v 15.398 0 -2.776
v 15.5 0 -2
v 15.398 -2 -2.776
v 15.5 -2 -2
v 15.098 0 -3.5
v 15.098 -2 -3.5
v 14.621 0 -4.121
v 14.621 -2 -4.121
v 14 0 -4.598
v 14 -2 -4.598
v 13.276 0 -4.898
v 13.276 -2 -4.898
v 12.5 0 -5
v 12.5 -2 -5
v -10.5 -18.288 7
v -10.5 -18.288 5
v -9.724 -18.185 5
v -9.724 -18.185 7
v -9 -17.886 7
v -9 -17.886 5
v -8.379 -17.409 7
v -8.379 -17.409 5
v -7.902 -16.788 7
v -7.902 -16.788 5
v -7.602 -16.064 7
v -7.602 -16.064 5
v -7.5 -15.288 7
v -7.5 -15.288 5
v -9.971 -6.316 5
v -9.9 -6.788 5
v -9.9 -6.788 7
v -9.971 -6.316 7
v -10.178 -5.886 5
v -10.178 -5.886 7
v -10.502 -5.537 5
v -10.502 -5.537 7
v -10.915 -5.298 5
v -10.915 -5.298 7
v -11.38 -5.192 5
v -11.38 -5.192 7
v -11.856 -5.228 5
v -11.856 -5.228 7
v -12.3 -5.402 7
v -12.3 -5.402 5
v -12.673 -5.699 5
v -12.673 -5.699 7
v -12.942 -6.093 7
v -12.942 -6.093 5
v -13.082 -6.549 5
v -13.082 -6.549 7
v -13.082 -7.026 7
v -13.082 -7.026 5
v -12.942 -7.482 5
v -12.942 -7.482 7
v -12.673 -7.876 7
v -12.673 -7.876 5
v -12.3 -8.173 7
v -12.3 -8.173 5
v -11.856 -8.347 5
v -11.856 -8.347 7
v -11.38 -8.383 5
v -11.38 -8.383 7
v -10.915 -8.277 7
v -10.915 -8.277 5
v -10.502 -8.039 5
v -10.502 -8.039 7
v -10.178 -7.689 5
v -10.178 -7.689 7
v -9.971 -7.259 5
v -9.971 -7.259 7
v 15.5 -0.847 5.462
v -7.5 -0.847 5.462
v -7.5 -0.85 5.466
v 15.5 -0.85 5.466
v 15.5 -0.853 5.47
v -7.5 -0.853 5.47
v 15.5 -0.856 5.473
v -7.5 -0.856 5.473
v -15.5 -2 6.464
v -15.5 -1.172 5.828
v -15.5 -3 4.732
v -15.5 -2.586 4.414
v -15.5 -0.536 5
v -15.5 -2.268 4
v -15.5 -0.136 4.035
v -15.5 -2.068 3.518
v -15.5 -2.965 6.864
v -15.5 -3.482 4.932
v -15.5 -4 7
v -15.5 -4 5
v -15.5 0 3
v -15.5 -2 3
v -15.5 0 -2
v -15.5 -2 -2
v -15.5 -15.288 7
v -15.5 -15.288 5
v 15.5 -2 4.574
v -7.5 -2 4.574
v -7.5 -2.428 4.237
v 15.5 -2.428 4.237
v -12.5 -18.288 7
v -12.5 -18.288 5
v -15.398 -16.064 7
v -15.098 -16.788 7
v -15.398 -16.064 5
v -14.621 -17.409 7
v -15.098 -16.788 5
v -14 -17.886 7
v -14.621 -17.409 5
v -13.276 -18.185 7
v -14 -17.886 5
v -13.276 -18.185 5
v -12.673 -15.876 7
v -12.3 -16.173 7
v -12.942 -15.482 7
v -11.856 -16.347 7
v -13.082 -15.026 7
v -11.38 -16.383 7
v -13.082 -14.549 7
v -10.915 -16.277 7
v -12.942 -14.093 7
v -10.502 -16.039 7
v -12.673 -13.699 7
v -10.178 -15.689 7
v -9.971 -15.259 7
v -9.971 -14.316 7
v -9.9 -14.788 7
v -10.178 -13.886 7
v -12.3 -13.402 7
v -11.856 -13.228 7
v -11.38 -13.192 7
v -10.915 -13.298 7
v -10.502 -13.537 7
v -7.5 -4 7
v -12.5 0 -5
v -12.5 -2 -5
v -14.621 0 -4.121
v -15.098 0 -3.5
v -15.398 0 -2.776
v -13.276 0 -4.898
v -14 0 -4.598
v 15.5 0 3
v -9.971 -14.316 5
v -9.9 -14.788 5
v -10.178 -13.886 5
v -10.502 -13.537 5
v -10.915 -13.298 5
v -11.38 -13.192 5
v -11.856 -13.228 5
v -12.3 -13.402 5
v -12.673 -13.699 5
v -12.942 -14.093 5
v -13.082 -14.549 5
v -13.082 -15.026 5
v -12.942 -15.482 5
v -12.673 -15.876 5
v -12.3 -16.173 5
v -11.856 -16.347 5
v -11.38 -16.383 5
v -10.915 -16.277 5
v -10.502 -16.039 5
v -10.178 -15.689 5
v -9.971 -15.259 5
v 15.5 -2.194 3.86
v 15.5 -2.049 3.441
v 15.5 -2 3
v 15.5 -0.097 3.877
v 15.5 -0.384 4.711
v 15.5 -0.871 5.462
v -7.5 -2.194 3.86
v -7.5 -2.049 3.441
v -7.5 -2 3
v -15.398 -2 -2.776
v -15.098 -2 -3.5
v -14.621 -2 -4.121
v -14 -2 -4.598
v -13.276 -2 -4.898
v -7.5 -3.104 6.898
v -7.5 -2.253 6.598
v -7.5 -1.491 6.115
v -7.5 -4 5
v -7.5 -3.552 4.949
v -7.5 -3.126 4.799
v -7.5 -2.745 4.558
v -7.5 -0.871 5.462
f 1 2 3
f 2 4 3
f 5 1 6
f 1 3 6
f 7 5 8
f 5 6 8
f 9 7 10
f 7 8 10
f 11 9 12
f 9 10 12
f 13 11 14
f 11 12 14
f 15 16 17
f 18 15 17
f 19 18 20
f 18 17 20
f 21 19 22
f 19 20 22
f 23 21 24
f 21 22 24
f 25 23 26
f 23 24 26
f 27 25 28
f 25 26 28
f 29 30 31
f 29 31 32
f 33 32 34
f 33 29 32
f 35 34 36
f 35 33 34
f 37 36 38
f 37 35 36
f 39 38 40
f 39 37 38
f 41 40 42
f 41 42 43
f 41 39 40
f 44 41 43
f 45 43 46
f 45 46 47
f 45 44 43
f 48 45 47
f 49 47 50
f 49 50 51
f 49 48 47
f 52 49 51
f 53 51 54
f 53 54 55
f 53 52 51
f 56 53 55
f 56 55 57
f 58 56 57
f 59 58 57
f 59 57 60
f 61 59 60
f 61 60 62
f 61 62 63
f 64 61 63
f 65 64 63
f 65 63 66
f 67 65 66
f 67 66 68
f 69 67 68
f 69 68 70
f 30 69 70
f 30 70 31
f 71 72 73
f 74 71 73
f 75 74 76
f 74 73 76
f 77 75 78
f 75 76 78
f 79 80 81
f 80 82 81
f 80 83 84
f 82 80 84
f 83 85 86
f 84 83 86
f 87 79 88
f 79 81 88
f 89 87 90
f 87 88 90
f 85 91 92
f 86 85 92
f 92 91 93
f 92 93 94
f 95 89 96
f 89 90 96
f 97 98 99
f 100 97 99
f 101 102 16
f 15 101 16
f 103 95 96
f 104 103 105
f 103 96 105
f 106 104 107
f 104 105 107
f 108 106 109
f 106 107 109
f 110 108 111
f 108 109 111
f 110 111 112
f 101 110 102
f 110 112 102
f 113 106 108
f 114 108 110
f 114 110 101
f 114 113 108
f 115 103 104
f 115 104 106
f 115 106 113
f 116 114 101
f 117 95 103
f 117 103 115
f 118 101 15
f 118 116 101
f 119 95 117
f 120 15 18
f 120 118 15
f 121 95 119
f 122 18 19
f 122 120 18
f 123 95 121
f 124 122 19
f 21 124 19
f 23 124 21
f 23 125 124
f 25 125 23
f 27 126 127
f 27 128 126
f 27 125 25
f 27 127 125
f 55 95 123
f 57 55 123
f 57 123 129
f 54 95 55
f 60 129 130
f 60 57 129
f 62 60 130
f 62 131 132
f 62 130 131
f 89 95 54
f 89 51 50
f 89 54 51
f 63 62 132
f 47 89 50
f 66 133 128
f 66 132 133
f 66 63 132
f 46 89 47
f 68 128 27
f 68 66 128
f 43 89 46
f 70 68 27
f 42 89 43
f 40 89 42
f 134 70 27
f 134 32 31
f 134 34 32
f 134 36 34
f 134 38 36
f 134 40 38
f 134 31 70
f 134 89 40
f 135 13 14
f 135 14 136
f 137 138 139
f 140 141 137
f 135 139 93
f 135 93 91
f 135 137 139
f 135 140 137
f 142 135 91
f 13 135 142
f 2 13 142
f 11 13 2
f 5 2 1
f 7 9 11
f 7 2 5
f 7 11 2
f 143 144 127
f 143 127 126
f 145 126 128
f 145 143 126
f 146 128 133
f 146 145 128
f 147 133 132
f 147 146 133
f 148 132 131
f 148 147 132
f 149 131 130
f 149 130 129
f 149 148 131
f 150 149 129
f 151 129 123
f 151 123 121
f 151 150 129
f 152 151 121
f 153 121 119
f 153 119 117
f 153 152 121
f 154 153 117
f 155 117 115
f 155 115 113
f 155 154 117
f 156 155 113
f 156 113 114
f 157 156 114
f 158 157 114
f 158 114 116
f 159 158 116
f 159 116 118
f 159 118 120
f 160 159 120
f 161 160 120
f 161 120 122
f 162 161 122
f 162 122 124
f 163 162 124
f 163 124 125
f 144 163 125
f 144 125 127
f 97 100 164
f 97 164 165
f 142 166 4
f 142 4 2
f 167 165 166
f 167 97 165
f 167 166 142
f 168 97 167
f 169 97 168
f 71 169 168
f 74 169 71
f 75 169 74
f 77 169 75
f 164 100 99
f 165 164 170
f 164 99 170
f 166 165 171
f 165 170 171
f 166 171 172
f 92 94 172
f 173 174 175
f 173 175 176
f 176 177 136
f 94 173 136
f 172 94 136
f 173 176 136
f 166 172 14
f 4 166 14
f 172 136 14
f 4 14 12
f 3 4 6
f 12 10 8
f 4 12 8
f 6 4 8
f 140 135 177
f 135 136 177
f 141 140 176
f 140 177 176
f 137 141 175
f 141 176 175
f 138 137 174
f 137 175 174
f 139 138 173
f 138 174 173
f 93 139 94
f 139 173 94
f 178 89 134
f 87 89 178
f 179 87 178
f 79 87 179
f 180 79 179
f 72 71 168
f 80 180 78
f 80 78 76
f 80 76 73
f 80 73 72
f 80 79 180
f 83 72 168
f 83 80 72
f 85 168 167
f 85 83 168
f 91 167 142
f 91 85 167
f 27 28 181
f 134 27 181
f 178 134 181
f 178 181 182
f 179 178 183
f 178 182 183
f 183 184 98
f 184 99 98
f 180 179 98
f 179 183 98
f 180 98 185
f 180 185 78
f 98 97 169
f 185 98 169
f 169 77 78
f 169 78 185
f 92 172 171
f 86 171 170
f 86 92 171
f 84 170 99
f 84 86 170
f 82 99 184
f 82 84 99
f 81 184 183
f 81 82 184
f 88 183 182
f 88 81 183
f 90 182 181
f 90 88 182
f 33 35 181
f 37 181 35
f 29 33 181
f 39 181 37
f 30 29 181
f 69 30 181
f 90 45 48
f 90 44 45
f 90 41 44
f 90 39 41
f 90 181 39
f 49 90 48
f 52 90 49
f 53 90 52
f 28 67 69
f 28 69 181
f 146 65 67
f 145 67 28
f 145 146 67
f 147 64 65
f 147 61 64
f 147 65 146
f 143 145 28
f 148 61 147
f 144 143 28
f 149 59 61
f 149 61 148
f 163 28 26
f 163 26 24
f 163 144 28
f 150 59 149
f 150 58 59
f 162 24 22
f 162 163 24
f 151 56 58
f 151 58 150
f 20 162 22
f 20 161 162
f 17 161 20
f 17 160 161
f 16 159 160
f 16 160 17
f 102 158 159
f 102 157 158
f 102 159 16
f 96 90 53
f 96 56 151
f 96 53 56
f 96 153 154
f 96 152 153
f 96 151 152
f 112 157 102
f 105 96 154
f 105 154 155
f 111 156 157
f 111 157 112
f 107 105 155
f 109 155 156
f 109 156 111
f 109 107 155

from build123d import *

# Parameters (mm, degrees)
SM_BASE_FLANGE_1_DEPTH = 2
SKETCH_8_R             = 1.6
CUT_EXTRUDE_1_DEPTH    = 10
FILLET_1_R             = 3
OTHER_START            = 6.58904
OTHER_1_OUTLINE_W      = 8
OTHER_1_OUTLINE_H      = 2
OTHER_1_DEPTH          = 15.41096
OTHER_START_2          = 5
OTHER_1_2_OUTLINE_R    = 1.6
OTHER_1_2_DEPTH        = 0.473479212
OTHER_START_3          = 6.529597681
OTHER_1_3_OUTLINE_W    = 8
OTHER_1_3_OUTLINE_H    = 2
OTHER_1_3_DEPTH        = 0.059442319
OTHER_START_4          = 3
OTHER_1_4_OUTLINE_R    = 1.6
OTHER_1_4_DEPTH        = 4
OTHER_1_5_OUTLINE_W    = 23
OTHER_1_5_OUTLINE_H    = 2
OTHER_1_5_DEPTH        = 0.46188997
OTHER_START_5          = -15.5
OTHER_1_6_DEPTH        = 31
OTHER_START_6          = -7.5
OTHER_1_7_DEPTH        = 23
OTHER_1_8_DEPTH        = 23


with BuildPart() as part:
    # 基体-法兰1: sheet metal written as solids
    # Sketch 1 → 基体-法兰1 (new body)
    with BuildSketch(Plane(origin=(0, 0, 0), x_dir=(1, 0, 0), z_dir=(0, 1, 0))):
        Polygon((-7.5, -5), (15.5, -5), (15.5, 5), (-15.5, 5), (-15.5, -5), (-15.5, -22), (-7.5, -22), align=None)
    extrude(amount=-SM_BASE_FLANGE_1_DEPTH)

    # 草图8 → 切除-拉伸1 (cut)
    with BuildSketch(Plane.XZ.offset(2)):
        with Locations(Location((-11.5, 18.5, 0), (0, 0, 270))):
            Circle(SKETCH_8_R)
        with Locations(Location((-11.5, 10.5, 0), (0, 0, 270))):
            Circle(SKETCH_8_R)
    extrude(amount=-CUT_EXTRUDE_1_DEPTH, mode=Mode.SUBTRACT)

    # 圆角1
    fillet_1_edges = [part.edges().sort_by_distance(p)[0] for p in [
        (15.5, -1, -5),
        (-15.5, -1, -5),
        (-15.5, -1, 22),
        (-7.5, -1, 22),
    ]]
    fillet(fillet_1_edges, radius=FILLET_1_R)

    # Other 1: read off the stored shape, not the designer's step
    # Other 1 outline → Other 1 (cut)
    with BuildSketch(Plane.XY.offset(OTHER_START)):
        with Locations((-11.5, -1)):
            Rectangle(OTHER_1_OUTLINE_W, OTHER_1_OUTLINE_H)
    extrude(amount=OTHER_1_DEPTH, mode=Mode.SUBTRACT)

    # Other 1 2 outline → Other 1 2 (add)
    with BuildSketch(Plane.XY.offset(OTHER_START_2)):
        with BuildLine():
            Line((-7.5, -15.28761102), (-7.5, -2))
            Line((-7.5, -2), (-15.5, -2))
            Line((-15.5, -2), (-15.5, -15.28761102))
            ThreePointArc((-15.5, -15.28761102), (-14.621320344, -17.408931363), (-12.5, -18.28761102))
            Line((-12.5, -18.28761102), (-10.5, -18.28761102))
            ThreePointArc((-10.5, -18.28761102), (-8.378679656, -17.408931364), (-7.5, -15.28761102))
        make_face()
        with Locations((-11.5, -14.78761102)):
            Circle(OTHER_1_2_OUTLINE_R, mode=Mode.SUBTRACT)
        with Locations((-11.5, -6.78761102)):
            Circle(OTHER_1_2_OUTLINE_R, mode=Mode.SUBTRACT)
    extrude(amount=OTHER_1_2_DEPTH)

    # Other 1 3 outline → Other 1 3 (cut)
    with BuildSketch(Plane.XY.offset(OTHER_START_3)):
        with Locations((-11.5, -1)):
            Rectangle(OTHER_1_3_OUTLINE_W, OTHER_1_3_OUTLINE_H)
    extrude(amount=OTHER_1_3_DEPTH, mode=Mode.SUBTRACT)

    # Other 1 4 outline → Other 1 4 (add)
    with BuildSketch(Plane.XY.offset(OTHER_START_4)):
        with BuildLine():
            Line((-7.5, -15.28761102), (-7.5, -2))
            Line((-7.5, -2), (-15.5, -2))
            Line((-15.5, -2), (-15.5, -15.28761102))
            ThreePointArc((-15.5, -15.28761102), (-14.621320344, -17.408931363), (-12.5, -18.28761102))
            Line((-12.5, -18.28761102), (-10.5, -18.28761102))
            ThreePointArc((-10.5, -18.28761102), (-8.378679656, -17.408931364), (-7.5, -15.28761102))
        make_face()
        with Locations((-11.5, -14.78761102)):
            Circle(OTHER_1_4_OUTLINE_R, mode=Mode.SUBTRACT)
        with Locations((-11.5, -6.78761102)):
            Circle(OTHER_1_4_OUTLINE_R, mode=Mode.SUBTRACT)
    extrude(amount=OTHER_1_4_DEPTH)

    # Other 1 5 outline → Other 1 5 (add)
    with BuildSketch(Plane.XY.offset(OTHER_START_2)):
        with Locations((4, -1)):
            Rectangle(OTHER_1_5_OUTLINE_W, OTHER_1_5_OUTLINE_H)
    extrude(amount=OTHER_1_5_DEPTH)

    # Other 1 6 outline → Other 1 6 (cut)
    with BuildSketch(Plane.YZ.offset(OTHER_START_5)):
        with BuildLine():
            ThreePointArc((-2, 3), (-2.585786438, 4.414213562), (-4, 5))
            Line((-4, 5), (-18.28761102, 5))
            Line((-18.28761102, 5), (-18.28761102, 3))
            Line((-18.28761102, 3), (-2, 3))
        make_face()
        with BuildLine():
            Line((-2, 7), (-4, 7))
            ThreePointArc((-4, 7), (-1.171572875, 5.828427125), (0, 3))
            Line((0, 3), (0, 6.529597681))
            Line((0, 6.529597681), (-2, 6.529597681))
            Line((-2, 6.529597681), (-2, 7))
        make_face()
    extrude(amount=OTHER_1_6_DEPTH, mode=Mode.SUBTRACT)

    # Other 1 7 outline → Other 1 7 (cut)
    with BuildSketch(Plane.YZ.offset(OTHER_START_6)):
        Polygon((-2, 5.46188997), (-2, 4.573685779), (-0.871179745, 5.46188997), align=None)
    extrude(amount=OTHER_1_7_DEPTH, mode=Mode.SUBTRACT)

    # Other 1 8 outline → Other 1 8 (add)
    with BuildSketch(Plane.YZ.offset(OTHER_START_6)):
        with BuildLine():
            Line((-2, 4.573685779), (-2.428225479, 4.236739606))
            ThreePointArc((-2.428225479, 4.236739606), (-2.110086108, 3.654389393), (-2, 3))
            Line((-2, 3), (-2, 4.573685779))
        make_face()
        with BuildLine():
            Line((-0.856450957, 5.473479212), (-0.871179745, 5.46188997))
            Line((-0.871179745, 5.46188997), (-0.847366533, 5.46188997))
            ThreePointArc((-0.847366533, 5.46188997), (-0.851903412, 5.467688772), (-0.856450957, 5.473479212))
        make_face()
    extrude(amount=OTHER_1_8_DEPTH)


solid = part.part
